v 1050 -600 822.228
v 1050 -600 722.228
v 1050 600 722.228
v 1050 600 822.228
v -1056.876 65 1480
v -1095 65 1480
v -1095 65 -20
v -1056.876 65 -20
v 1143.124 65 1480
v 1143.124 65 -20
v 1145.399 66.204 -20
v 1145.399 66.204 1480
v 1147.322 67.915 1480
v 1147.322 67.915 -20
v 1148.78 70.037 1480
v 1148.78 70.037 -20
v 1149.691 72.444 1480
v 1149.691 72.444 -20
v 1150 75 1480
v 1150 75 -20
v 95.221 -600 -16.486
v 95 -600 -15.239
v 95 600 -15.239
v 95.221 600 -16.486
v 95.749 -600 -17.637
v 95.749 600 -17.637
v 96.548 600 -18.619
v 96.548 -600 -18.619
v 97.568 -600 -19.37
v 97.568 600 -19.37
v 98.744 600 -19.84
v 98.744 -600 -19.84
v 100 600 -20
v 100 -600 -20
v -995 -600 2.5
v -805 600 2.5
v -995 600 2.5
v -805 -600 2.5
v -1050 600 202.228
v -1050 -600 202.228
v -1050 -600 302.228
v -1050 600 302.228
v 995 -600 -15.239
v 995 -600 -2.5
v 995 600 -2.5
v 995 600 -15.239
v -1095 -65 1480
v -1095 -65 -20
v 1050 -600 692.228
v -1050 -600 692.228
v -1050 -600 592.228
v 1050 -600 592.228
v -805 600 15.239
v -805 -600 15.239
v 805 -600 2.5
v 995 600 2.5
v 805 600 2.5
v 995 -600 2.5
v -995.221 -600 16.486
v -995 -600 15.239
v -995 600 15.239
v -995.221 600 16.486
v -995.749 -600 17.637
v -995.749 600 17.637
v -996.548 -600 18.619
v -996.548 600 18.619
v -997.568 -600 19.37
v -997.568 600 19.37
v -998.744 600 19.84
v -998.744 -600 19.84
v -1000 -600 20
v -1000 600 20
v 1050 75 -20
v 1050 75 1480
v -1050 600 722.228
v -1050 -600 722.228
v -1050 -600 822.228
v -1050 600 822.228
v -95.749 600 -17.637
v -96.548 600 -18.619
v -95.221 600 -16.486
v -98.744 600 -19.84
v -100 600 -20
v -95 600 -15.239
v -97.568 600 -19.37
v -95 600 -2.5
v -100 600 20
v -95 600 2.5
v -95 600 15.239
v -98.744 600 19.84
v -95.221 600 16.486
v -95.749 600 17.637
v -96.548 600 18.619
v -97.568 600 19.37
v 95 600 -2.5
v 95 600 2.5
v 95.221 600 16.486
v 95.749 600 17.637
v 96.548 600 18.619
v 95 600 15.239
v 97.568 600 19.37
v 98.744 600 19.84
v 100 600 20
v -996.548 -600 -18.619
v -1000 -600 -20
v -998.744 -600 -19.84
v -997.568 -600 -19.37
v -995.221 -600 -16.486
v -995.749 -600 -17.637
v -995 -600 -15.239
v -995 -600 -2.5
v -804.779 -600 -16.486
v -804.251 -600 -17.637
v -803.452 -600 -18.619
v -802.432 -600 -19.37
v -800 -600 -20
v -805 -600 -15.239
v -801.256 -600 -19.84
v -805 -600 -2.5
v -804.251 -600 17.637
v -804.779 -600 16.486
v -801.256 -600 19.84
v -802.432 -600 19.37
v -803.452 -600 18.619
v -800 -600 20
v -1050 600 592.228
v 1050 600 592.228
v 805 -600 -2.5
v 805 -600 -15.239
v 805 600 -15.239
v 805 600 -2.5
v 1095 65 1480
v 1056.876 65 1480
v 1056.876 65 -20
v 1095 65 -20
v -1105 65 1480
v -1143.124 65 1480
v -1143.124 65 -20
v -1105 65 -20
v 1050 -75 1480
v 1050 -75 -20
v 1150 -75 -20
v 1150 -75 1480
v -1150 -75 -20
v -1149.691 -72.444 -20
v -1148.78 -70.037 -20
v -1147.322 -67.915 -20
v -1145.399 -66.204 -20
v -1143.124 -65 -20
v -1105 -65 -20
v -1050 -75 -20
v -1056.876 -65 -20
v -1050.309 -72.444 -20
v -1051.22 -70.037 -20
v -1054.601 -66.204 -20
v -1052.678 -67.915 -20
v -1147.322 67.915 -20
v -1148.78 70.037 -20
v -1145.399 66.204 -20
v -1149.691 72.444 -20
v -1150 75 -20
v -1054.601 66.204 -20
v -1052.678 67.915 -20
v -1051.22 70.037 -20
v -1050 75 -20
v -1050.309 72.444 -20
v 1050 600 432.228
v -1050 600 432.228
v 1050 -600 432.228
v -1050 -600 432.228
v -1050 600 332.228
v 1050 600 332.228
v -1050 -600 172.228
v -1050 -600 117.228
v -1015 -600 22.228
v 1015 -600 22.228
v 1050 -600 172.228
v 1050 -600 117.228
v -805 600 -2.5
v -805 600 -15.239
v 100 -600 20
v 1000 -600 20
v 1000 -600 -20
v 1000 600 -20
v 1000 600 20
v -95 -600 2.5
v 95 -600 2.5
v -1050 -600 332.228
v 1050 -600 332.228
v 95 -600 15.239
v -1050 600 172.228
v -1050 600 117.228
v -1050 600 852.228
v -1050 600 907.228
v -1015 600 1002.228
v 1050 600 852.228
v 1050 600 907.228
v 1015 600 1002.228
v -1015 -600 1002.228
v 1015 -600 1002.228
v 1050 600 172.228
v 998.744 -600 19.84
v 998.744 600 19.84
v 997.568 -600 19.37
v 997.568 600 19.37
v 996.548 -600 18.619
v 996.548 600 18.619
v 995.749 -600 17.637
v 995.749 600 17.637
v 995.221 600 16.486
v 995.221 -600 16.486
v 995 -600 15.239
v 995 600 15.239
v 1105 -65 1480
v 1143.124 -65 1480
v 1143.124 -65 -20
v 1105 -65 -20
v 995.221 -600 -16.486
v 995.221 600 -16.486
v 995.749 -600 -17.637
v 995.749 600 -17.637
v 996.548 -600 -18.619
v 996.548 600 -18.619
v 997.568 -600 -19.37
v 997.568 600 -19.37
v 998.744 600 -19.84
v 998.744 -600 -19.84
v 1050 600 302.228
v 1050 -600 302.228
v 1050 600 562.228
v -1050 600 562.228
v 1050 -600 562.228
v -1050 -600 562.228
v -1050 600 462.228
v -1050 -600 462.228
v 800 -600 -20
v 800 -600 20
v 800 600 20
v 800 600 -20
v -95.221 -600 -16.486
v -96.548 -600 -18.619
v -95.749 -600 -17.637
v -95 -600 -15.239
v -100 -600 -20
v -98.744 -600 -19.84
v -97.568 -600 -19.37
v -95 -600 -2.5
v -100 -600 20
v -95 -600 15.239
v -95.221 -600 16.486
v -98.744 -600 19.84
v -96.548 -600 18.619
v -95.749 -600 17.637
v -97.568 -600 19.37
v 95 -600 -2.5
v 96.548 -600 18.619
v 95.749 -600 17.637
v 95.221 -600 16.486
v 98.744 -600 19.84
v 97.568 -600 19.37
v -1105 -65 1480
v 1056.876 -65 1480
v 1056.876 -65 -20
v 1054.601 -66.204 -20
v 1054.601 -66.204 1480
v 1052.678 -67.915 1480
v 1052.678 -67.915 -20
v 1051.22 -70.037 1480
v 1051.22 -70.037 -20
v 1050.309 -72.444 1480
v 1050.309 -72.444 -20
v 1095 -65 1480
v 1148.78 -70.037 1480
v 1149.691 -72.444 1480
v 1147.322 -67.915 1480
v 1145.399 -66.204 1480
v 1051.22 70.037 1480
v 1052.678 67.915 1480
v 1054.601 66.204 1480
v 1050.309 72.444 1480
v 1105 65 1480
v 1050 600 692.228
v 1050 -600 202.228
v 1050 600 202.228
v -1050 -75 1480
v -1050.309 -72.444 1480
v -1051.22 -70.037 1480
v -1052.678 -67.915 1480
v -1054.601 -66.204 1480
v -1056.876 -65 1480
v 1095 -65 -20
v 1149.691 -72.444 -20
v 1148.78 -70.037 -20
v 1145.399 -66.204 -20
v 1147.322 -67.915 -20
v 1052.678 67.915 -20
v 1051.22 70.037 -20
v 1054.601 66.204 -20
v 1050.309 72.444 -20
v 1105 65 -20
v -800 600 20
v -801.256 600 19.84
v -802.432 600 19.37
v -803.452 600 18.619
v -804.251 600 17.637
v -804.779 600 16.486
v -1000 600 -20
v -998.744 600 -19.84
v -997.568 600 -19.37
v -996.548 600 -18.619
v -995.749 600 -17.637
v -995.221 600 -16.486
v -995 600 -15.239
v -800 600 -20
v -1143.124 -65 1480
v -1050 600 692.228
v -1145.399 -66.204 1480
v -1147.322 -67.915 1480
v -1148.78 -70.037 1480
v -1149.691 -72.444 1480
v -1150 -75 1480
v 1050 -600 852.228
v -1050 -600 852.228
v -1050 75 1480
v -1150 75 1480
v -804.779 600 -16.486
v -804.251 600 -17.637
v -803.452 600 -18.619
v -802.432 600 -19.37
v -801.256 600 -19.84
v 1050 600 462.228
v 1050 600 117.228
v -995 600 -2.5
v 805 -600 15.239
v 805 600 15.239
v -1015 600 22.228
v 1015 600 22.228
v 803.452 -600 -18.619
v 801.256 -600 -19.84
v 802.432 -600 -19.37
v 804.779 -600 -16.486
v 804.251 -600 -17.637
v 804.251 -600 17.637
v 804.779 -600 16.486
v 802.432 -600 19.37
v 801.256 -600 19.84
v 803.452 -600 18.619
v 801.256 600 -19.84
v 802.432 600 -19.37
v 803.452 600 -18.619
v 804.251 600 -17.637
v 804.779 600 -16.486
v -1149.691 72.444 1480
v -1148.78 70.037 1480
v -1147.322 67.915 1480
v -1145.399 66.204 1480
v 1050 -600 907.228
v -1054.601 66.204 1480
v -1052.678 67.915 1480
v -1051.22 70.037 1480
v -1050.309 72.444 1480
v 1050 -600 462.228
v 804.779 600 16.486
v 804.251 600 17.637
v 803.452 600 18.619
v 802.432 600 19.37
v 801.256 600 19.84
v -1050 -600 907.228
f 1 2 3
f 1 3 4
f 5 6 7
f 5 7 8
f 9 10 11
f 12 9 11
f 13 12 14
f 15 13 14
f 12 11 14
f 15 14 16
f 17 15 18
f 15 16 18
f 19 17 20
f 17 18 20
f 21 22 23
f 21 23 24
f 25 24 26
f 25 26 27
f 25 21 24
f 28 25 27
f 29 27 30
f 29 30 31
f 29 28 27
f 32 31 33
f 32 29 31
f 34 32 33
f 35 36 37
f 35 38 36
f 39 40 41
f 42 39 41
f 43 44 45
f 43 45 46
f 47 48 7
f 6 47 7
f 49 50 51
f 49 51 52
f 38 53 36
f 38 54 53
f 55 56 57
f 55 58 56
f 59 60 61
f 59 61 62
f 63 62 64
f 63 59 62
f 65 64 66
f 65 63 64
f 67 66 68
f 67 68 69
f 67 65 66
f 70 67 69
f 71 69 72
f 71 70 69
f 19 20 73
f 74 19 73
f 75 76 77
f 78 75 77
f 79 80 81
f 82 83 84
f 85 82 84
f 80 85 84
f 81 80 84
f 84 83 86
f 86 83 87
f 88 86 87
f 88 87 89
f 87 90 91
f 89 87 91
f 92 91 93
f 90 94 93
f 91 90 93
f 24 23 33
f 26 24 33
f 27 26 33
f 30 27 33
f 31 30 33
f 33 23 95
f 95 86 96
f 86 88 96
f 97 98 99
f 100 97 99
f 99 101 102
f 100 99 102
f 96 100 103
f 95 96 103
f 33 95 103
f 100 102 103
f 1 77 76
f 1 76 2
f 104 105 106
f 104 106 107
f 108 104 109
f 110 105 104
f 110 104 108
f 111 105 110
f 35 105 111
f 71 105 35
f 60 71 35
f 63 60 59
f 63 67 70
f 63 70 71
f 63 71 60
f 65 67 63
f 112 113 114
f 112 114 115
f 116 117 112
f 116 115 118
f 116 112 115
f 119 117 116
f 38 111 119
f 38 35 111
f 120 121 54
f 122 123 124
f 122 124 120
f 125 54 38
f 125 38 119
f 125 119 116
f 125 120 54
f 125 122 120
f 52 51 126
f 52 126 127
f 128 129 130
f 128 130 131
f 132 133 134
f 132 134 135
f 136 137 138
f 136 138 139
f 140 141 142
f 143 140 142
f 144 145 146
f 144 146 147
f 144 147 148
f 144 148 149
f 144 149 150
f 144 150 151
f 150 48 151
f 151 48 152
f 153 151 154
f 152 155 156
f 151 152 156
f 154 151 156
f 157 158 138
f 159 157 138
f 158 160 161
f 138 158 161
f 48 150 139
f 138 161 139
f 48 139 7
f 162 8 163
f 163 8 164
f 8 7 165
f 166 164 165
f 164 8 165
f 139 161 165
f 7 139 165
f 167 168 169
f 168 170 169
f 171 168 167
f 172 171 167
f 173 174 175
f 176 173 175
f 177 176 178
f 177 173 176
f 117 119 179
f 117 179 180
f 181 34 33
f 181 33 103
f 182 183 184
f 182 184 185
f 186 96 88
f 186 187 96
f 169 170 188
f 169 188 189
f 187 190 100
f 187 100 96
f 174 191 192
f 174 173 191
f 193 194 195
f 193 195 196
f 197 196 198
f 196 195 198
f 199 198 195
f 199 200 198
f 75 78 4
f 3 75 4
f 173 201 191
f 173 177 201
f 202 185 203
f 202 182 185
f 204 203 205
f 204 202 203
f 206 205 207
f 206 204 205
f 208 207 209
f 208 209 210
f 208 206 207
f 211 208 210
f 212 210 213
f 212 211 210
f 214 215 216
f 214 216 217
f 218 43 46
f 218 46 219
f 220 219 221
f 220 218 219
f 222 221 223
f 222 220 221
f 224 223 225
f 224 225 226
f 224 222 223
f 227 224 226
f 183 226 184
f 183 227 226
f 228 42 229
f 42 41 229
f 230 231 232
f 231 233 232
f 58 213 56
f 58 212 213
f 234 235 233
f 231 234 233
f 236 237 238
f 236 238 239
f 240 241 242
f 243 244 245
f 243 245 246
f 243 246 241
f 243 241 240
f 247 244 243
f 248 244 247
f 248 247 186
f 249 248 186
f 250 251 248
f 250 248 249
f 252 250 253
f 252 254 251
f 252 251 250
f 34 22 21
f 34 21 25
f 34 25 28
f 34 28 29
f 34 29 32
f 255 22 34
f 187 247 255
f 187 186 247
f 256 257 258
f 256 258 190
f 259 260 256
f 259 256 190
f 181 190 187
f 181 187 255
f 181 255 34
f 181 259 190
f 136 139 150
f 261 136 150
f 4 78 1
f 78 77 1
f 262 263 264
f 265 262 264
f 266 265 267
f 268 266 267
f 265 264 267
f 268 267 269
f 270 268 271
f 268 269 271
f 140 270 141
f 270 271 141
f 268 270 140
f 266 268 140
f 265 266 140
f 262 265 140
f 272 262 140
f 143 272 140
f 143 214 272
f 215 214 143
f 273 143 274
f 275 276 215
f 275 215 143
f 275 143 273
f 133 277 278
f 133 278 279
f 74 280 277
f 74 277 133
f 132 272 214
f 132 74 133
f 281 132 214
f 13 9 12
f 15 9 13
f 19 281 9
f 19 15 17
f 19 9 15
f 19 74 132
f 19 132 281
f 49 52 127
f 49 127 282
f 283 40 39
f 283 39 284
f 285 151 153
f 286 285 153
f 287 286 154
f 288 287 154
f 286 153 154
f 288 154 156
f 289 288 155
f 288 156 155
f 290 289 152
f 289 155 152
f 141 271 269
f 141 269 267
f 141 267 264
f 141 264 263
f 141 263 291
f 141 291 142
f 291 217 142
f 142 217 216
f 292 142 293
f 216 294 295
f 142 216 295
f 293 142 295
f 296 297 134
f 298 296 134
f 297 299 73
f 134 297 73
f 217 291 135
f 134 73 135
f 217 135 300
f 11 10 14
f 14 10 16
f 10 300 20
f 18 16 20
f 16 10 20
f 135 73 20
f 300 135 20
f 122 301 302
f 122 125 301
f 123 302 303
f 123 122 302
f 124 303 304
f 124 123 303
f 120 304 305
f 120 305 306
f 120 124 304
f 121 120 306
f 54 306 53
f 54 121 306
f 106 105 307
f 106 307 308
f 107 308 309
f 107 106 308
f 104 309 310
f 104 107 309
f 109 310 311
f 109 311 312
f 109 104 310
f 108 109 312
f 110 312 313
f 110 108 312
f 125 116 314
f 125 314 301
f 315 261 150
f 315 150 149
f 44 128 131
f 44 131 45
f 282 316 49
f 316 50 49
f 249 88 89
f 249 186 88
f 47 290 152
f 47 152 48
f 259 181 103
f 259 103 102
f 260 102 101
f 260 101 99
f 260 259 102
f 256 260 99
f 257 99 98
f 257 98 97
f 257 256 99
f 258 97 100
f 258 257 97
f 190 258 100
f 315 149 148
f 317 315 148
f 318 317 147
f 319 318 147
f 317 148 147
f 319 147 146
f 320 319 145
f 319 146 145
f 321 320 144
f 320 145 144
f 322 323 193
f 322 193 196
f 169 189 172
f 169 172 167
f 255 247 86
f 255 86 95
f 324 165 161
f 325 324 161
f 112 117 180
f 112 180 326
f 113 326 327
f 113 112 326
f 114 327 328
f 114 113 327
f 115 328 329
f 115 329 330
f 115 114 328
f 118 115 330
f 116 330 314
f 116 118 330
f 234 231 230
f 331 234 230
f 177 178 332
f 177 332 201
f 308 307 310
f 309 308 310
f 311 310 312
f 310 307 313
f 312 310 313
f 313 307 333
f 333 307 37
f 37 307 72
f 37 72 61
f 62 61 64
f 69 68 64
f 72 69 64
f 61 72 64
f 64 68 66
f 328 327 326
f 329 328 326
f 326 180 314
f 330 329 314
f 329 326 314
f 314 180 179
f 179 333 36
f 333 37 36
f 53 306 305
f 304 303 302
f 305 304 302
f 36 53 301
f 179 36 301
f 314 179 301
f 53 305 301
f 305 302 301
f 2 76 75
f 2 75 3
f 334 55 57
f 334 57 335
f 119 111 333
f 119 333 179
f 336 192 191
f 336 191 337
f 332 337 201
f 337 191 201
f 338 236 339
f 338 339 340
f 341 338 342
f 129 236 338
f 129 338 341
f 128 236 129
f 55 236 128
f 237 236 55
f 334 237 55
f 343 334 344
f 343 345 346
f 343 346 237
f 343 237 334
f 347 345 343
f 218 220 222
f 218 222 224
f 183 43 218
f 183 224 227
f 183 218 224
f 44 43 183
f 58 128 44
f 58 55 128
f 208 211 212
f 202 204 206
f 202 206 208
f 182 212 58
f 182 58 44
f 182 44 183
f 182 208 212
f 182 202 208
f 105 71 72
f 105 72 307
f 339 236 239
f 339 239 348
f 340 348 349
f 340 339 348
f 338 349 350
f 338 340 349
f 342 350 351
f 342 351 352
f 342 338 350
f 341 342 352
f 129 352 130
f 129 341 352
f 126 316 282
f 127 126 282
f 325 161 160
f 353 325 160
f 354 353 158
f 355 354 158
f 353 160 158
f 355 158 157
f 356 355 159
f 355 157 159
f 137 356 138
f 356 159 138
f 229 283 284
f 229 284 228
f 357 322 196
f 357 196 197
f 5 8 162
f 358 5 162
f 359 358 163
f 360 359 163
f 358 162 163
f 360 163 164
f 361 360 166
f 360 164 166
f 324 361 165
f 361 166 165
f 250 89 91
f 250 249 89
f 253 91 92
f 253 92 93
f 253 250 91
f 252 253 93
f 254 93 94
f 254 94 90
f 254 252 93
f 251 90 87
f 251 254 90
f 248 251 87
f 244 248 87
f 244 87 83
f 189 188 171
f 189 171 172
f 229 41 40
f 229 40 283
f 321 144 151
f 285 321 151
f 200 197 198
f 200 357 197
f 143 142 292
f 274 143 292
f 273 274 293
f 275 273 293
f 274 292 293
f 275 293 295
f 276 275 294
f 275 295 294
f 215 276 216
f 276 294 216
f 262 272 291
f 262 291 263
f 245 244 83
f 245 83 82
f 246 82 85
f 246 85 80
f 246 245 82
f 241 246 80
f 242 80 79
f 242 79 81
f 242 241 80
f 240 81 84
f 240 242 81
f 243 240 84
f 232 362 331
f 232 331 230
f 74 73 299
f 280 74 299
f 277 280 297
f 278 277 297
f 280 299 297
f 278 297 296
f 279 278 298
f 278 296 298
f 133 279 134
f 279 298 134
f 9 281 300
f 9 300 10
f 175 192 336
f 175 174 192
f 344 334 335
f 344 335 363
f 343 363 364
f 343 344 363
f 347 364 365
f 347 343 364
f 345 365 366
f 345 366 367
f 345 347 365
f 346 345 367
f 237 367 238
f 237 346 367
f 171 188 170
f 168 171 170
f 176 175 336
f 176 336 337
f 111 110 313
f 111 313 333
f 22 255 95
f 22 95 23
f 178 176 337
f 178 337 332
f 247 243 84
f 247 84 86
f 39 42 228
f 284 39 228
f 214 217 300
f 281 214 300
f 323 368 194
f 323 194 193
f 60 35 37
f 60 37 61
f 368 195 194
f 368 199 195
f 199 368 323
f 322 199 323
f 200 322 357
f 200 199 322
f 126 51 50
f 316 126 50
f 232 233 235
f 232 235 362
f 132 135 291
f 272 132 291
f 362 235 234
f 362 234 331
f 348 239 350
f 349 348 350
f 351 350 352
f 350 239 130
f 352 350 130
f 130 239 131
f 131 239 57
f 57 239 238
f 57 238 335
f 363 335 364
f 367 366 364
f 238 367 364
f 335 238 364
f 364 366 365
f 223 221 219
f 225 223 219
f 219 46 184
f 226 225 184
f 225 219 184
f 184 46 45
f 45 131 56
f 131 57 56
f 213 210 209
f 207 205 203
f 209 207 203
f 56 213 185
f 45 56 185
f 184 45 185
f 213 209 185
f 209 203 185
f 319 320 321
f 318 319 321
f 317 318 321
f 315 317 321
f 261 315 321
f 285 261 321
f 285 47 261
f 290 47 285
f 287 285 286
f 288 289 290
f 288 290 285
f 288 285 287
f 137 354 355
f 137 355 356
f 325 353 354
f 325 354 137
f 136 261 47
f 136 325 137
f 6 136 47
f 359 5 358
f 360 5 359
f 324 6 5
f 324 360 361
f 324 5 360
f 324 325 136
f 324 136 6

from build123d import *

# Parameters (mm, degrees)
F1_DEPTH = 600
F2_DEPTH = 600
F0_W     = 2100
F0_H     = 100
F5_DEPTH = 1500


with BuildPart() as f1:
    # F0 (on Front) → F1 (new body, symmetric)
    with BuildSketch(Plane.XZ):
        with BuildLine():
            Line((-805, 2.5), (-995, 2.5))
            Line((-995, 2.5), (-995, 15.2391958982))
            ThreePointArc((-995, 15.2391958982), (-996.5479985626, 18.6194305583), (-1000, 20))
            Line((-1000, 20), (-1000, -20))
            ThreePointArc((-1000, -20), (-996.5479985626, -18.6194305583), (-995, -15.2391958982))
            Line((-995, -15.2391958982), (-995, -2.5))
            Line((-995, -2.5), (-805, -2.5))
            Line((-805, -2.5), (-805, -15.2391958982))
            ThreePointArc((-805, -15.2391958982), (-803.4520014374, -18.6194305583), (-800, -20))
            Line((-800, -20), (-800, 20))
            ThreePointArc((-800, 20), (-803.4520014374, 18.6194305583), (-805, 15.2391958982))
            Line((-805, 15.2391958982), (-805, 2.5))
        make_face()
    extrude(amount=F1_DEPTH, both=True)


with BuildPart() as f1b:
    # F0 (on Front) → F1, piece 2 (new body, symmetric)
    with BuildSketch(Plane.XZ):
        with BuildLine():
            ThreePointArc((-95, 15.2391958982), (-96.5479985626, 18.6194305583), (-100, 20))
            Line((-100, 20), (-100, -20))
            ThreePointArc((-100, -20), (-96.5479985626, -18.6194305583), (-95, -15.2391958982))
            Line((-95, -15.2391958982), (-95, -2.5))
            Line((-95, -2.5), (95, -2.5))
            Line((95, -2.5), (95, -15.2391958982))
            ThreePointArc((95, -15.2391958982), (96.5479985626, -18.6194305583), (100, -20))
            Line((100, -20), (100, 20))
            ThreePointArc((100, 20), (96.5479985626, 18.6194305583), (95, 15.2391958982))
            Line((95, 15.2391958982), (95, 2.5))
            Line((95, 2.5), (-95, 2.5))
            Line((-95, 2.5), (-95, 15.2391958982))
        make_face()
    extrude(amount=F1_DEPTH, both=True)


with BuildPart() as f1c:
    # F0 (on Front) → F1, piece 3 (new body, symmetric)
    with BuildSketch(Plane.XZ):
        with BuildLine():
            Line((995, 2.5), (805, 2.5))
            Line((805, 2.5), (805, 15.2391958982))
            ThreePointArc((805, 15.2391958982), (803.4520014374, 18.6194305583), (800, 20))
            Line((800, 20), (800, -20))
            ThreePointArc((800, -20), (803.4520014374, -18.6194305583), (805, -15.2391958982))
            Line((805, -15.2391958982), (805, -2.5))
            Line((805, -2.5), (995, -2.5))
            Line((995, -2.5), (995, -15.2391958982))
            ThreePointArc((995, -15.2391958982), (996.5479985626, -18.6194305583), (1000, -20))
            Line((1000, -20), (1000, 20))
            ThreePointArc((1000, 20), (996.5479985626, 18.6194305583), (995, 15.2391958982))
            Line((995, 15.2391958982), (995, 2.5))
        make_face()
    extrude(amount=F1_DEPTH, both=True)


with BuildPart() as f2:
    # F0 (on Front) → F2 (new body, symmetric)
    with BuildSketch(Plane.XZ):
        Polygon((-1050, 117.2282844782), (-1015, 22.2282844782), (1015, 22.2282844782), (1050, 117.2282844782), (1050, 172.2282844782), (-1050, 172.2282844782), align=None)
    extrude(amount=F2_DEPTH, both=True)


with BuildPart() as f2b:
    # F0 (on Front) → F2, piece 2 (new body, symmetric)
    with BuildSketch(Plane.XZ):
        with Locations((0, 252.2282844782)):
            Rectangle(F0_W, F0_H)
    extrude(amount=F2_DEPTH, both=True)


with BuildPart() as f2c:
    # F0 (on Front) → F2, piece 3 (new body, symmetric)
    with BuildSketch(Plane.XZ):
        with Locations((0, 382.2282844782)):
            Rectangle(F0_W, F0_H)
    extrude(amount=F2_DEPTH, both=True)


with BuildPart() as f2d:
    # F0 (on Front) → F2, piece 4 (new body, symmetric)
    with BuildSketch(Plane.XZ):
        with Locations((0, 512.2282844782)):
            Rectangle(F0_W, F0_H)
    extrude(amount=F2_DEPTH, both=True)


with BuildPart() as f2e:
    # F0 (on Front) → F2, piece 5 (new body, symmetric)
    with BuildSketch(Plane.XZ):
        with Locations((0, 642.2282844782)):
            Rectangle(F0_W, F0_H)
    extrude(amount=F2_DEPTH, both=True)


with BuildPart() as f2f:
    # F0 (on Front) → F2, piece 6 (new body, symmetric)
    with BuildSketch(Plane.XZ):
        with Locations((0, 772.2282844782)):
            Rectangle(F0_W, F0_H)
    extrude(amount=F2_DEPTH, both=True)


with BuildPart() as f2g:
    # F0 (on Front) → F2, piece 7 (new body, symmetric)
    with BuildSketch(Plane.XZ):
        Polygon((-1015, 1002.2282844782), (-1050, 907.2282844782), (-1050, 852.2282844782), (1050, 852.2282844782), (1050, 907.2282844782), (1015, 1002.2282844782), align=None)
    extrude(amount=F2_DEPTH, both=True)


with BuildPart() as f5:
    # F4 (on 3pt) → F5 (new body)
    with BuildSketch(Plane.XY.offset(-20)):
        with BuildLine():
            ThreePointArc((1056.8763880603, -65), (1051.8849866554, -68.9319543353), (1050, -75))
            Line((1050, -75), (1150, -75))
            ThreePointArc((1150, -75), (1148.1150133446, -68.9319543353), (1143.1236119397, -65))
            Line((1143.1236119397, -65), (1105, -65))
            Line((1105, -65), (1105, 65))
            Line((1105, 65), (1143.1236119397, 65))
            ThreePointArc((1143.1236119397, 65), (1148.1150133446, 68.9319543353), (1150, 75))
            Line((1150, 75), (1050, 75))
            ThreePointArc((1050, 75), (1051.8849866554, 68.9319543353), (1056.8763880603, 65))
            Line((1056.8763880603, 65), (1095, 65))
            Line((1095, 65), (1095, -65))
            Line((1095, -65), (1056.8763880603, -65))
        make_face()
    extrude(amount=F5_DEPTH)


with BuildPart() as f5b:
    # F4 (on 3pt) → F5, piece 2 (new body)
    with BuildSketch(Plane.XY.offset(-20)):
        with BuildLine():
            ThreePointArc((-1050, -75), (-1051.8849866554, -68.9319543353), (-1056.8763880603, -65))
            Line((-1056.8763880603, -65), (-1095, -65))
            Line((-1095, -65), (-1095, 65))
            Line((-1095, 65), (-1056.8763880603, 65))
            ThreePointArc((-1056.8763880603, 65), (-1051.8849866554, 68.9319543353), (-1050, 75))
            Line((-1050, 75), (-1150, 75))
            ThreePointArc((-1150, 75), (-1148.1150133446, 68.9319543353), (-1143.1236119397, 65))
            Line((-1143.1236119397, 65), (-1105, 65))
            Line((-1105, 65), (-1105, -65))
            Line((-1105, -65), (-1143.1236119397, -65))
            ThreePointArc((-1143.1236119397, -65), (-1148.1150133446, -68.9319543353), (-1150, -75))
            Line((-1150, -75), (-1050, -75))
        make_face()
    extrude(amount=F5_DEPTH)


solid = Compound([f1.part, f1b.part, f1c.part, f2.part, f2b.part, f2c.part, f2d.part, f2e.part, f2f.part, f2g.part, f5.part, f5b.part])
